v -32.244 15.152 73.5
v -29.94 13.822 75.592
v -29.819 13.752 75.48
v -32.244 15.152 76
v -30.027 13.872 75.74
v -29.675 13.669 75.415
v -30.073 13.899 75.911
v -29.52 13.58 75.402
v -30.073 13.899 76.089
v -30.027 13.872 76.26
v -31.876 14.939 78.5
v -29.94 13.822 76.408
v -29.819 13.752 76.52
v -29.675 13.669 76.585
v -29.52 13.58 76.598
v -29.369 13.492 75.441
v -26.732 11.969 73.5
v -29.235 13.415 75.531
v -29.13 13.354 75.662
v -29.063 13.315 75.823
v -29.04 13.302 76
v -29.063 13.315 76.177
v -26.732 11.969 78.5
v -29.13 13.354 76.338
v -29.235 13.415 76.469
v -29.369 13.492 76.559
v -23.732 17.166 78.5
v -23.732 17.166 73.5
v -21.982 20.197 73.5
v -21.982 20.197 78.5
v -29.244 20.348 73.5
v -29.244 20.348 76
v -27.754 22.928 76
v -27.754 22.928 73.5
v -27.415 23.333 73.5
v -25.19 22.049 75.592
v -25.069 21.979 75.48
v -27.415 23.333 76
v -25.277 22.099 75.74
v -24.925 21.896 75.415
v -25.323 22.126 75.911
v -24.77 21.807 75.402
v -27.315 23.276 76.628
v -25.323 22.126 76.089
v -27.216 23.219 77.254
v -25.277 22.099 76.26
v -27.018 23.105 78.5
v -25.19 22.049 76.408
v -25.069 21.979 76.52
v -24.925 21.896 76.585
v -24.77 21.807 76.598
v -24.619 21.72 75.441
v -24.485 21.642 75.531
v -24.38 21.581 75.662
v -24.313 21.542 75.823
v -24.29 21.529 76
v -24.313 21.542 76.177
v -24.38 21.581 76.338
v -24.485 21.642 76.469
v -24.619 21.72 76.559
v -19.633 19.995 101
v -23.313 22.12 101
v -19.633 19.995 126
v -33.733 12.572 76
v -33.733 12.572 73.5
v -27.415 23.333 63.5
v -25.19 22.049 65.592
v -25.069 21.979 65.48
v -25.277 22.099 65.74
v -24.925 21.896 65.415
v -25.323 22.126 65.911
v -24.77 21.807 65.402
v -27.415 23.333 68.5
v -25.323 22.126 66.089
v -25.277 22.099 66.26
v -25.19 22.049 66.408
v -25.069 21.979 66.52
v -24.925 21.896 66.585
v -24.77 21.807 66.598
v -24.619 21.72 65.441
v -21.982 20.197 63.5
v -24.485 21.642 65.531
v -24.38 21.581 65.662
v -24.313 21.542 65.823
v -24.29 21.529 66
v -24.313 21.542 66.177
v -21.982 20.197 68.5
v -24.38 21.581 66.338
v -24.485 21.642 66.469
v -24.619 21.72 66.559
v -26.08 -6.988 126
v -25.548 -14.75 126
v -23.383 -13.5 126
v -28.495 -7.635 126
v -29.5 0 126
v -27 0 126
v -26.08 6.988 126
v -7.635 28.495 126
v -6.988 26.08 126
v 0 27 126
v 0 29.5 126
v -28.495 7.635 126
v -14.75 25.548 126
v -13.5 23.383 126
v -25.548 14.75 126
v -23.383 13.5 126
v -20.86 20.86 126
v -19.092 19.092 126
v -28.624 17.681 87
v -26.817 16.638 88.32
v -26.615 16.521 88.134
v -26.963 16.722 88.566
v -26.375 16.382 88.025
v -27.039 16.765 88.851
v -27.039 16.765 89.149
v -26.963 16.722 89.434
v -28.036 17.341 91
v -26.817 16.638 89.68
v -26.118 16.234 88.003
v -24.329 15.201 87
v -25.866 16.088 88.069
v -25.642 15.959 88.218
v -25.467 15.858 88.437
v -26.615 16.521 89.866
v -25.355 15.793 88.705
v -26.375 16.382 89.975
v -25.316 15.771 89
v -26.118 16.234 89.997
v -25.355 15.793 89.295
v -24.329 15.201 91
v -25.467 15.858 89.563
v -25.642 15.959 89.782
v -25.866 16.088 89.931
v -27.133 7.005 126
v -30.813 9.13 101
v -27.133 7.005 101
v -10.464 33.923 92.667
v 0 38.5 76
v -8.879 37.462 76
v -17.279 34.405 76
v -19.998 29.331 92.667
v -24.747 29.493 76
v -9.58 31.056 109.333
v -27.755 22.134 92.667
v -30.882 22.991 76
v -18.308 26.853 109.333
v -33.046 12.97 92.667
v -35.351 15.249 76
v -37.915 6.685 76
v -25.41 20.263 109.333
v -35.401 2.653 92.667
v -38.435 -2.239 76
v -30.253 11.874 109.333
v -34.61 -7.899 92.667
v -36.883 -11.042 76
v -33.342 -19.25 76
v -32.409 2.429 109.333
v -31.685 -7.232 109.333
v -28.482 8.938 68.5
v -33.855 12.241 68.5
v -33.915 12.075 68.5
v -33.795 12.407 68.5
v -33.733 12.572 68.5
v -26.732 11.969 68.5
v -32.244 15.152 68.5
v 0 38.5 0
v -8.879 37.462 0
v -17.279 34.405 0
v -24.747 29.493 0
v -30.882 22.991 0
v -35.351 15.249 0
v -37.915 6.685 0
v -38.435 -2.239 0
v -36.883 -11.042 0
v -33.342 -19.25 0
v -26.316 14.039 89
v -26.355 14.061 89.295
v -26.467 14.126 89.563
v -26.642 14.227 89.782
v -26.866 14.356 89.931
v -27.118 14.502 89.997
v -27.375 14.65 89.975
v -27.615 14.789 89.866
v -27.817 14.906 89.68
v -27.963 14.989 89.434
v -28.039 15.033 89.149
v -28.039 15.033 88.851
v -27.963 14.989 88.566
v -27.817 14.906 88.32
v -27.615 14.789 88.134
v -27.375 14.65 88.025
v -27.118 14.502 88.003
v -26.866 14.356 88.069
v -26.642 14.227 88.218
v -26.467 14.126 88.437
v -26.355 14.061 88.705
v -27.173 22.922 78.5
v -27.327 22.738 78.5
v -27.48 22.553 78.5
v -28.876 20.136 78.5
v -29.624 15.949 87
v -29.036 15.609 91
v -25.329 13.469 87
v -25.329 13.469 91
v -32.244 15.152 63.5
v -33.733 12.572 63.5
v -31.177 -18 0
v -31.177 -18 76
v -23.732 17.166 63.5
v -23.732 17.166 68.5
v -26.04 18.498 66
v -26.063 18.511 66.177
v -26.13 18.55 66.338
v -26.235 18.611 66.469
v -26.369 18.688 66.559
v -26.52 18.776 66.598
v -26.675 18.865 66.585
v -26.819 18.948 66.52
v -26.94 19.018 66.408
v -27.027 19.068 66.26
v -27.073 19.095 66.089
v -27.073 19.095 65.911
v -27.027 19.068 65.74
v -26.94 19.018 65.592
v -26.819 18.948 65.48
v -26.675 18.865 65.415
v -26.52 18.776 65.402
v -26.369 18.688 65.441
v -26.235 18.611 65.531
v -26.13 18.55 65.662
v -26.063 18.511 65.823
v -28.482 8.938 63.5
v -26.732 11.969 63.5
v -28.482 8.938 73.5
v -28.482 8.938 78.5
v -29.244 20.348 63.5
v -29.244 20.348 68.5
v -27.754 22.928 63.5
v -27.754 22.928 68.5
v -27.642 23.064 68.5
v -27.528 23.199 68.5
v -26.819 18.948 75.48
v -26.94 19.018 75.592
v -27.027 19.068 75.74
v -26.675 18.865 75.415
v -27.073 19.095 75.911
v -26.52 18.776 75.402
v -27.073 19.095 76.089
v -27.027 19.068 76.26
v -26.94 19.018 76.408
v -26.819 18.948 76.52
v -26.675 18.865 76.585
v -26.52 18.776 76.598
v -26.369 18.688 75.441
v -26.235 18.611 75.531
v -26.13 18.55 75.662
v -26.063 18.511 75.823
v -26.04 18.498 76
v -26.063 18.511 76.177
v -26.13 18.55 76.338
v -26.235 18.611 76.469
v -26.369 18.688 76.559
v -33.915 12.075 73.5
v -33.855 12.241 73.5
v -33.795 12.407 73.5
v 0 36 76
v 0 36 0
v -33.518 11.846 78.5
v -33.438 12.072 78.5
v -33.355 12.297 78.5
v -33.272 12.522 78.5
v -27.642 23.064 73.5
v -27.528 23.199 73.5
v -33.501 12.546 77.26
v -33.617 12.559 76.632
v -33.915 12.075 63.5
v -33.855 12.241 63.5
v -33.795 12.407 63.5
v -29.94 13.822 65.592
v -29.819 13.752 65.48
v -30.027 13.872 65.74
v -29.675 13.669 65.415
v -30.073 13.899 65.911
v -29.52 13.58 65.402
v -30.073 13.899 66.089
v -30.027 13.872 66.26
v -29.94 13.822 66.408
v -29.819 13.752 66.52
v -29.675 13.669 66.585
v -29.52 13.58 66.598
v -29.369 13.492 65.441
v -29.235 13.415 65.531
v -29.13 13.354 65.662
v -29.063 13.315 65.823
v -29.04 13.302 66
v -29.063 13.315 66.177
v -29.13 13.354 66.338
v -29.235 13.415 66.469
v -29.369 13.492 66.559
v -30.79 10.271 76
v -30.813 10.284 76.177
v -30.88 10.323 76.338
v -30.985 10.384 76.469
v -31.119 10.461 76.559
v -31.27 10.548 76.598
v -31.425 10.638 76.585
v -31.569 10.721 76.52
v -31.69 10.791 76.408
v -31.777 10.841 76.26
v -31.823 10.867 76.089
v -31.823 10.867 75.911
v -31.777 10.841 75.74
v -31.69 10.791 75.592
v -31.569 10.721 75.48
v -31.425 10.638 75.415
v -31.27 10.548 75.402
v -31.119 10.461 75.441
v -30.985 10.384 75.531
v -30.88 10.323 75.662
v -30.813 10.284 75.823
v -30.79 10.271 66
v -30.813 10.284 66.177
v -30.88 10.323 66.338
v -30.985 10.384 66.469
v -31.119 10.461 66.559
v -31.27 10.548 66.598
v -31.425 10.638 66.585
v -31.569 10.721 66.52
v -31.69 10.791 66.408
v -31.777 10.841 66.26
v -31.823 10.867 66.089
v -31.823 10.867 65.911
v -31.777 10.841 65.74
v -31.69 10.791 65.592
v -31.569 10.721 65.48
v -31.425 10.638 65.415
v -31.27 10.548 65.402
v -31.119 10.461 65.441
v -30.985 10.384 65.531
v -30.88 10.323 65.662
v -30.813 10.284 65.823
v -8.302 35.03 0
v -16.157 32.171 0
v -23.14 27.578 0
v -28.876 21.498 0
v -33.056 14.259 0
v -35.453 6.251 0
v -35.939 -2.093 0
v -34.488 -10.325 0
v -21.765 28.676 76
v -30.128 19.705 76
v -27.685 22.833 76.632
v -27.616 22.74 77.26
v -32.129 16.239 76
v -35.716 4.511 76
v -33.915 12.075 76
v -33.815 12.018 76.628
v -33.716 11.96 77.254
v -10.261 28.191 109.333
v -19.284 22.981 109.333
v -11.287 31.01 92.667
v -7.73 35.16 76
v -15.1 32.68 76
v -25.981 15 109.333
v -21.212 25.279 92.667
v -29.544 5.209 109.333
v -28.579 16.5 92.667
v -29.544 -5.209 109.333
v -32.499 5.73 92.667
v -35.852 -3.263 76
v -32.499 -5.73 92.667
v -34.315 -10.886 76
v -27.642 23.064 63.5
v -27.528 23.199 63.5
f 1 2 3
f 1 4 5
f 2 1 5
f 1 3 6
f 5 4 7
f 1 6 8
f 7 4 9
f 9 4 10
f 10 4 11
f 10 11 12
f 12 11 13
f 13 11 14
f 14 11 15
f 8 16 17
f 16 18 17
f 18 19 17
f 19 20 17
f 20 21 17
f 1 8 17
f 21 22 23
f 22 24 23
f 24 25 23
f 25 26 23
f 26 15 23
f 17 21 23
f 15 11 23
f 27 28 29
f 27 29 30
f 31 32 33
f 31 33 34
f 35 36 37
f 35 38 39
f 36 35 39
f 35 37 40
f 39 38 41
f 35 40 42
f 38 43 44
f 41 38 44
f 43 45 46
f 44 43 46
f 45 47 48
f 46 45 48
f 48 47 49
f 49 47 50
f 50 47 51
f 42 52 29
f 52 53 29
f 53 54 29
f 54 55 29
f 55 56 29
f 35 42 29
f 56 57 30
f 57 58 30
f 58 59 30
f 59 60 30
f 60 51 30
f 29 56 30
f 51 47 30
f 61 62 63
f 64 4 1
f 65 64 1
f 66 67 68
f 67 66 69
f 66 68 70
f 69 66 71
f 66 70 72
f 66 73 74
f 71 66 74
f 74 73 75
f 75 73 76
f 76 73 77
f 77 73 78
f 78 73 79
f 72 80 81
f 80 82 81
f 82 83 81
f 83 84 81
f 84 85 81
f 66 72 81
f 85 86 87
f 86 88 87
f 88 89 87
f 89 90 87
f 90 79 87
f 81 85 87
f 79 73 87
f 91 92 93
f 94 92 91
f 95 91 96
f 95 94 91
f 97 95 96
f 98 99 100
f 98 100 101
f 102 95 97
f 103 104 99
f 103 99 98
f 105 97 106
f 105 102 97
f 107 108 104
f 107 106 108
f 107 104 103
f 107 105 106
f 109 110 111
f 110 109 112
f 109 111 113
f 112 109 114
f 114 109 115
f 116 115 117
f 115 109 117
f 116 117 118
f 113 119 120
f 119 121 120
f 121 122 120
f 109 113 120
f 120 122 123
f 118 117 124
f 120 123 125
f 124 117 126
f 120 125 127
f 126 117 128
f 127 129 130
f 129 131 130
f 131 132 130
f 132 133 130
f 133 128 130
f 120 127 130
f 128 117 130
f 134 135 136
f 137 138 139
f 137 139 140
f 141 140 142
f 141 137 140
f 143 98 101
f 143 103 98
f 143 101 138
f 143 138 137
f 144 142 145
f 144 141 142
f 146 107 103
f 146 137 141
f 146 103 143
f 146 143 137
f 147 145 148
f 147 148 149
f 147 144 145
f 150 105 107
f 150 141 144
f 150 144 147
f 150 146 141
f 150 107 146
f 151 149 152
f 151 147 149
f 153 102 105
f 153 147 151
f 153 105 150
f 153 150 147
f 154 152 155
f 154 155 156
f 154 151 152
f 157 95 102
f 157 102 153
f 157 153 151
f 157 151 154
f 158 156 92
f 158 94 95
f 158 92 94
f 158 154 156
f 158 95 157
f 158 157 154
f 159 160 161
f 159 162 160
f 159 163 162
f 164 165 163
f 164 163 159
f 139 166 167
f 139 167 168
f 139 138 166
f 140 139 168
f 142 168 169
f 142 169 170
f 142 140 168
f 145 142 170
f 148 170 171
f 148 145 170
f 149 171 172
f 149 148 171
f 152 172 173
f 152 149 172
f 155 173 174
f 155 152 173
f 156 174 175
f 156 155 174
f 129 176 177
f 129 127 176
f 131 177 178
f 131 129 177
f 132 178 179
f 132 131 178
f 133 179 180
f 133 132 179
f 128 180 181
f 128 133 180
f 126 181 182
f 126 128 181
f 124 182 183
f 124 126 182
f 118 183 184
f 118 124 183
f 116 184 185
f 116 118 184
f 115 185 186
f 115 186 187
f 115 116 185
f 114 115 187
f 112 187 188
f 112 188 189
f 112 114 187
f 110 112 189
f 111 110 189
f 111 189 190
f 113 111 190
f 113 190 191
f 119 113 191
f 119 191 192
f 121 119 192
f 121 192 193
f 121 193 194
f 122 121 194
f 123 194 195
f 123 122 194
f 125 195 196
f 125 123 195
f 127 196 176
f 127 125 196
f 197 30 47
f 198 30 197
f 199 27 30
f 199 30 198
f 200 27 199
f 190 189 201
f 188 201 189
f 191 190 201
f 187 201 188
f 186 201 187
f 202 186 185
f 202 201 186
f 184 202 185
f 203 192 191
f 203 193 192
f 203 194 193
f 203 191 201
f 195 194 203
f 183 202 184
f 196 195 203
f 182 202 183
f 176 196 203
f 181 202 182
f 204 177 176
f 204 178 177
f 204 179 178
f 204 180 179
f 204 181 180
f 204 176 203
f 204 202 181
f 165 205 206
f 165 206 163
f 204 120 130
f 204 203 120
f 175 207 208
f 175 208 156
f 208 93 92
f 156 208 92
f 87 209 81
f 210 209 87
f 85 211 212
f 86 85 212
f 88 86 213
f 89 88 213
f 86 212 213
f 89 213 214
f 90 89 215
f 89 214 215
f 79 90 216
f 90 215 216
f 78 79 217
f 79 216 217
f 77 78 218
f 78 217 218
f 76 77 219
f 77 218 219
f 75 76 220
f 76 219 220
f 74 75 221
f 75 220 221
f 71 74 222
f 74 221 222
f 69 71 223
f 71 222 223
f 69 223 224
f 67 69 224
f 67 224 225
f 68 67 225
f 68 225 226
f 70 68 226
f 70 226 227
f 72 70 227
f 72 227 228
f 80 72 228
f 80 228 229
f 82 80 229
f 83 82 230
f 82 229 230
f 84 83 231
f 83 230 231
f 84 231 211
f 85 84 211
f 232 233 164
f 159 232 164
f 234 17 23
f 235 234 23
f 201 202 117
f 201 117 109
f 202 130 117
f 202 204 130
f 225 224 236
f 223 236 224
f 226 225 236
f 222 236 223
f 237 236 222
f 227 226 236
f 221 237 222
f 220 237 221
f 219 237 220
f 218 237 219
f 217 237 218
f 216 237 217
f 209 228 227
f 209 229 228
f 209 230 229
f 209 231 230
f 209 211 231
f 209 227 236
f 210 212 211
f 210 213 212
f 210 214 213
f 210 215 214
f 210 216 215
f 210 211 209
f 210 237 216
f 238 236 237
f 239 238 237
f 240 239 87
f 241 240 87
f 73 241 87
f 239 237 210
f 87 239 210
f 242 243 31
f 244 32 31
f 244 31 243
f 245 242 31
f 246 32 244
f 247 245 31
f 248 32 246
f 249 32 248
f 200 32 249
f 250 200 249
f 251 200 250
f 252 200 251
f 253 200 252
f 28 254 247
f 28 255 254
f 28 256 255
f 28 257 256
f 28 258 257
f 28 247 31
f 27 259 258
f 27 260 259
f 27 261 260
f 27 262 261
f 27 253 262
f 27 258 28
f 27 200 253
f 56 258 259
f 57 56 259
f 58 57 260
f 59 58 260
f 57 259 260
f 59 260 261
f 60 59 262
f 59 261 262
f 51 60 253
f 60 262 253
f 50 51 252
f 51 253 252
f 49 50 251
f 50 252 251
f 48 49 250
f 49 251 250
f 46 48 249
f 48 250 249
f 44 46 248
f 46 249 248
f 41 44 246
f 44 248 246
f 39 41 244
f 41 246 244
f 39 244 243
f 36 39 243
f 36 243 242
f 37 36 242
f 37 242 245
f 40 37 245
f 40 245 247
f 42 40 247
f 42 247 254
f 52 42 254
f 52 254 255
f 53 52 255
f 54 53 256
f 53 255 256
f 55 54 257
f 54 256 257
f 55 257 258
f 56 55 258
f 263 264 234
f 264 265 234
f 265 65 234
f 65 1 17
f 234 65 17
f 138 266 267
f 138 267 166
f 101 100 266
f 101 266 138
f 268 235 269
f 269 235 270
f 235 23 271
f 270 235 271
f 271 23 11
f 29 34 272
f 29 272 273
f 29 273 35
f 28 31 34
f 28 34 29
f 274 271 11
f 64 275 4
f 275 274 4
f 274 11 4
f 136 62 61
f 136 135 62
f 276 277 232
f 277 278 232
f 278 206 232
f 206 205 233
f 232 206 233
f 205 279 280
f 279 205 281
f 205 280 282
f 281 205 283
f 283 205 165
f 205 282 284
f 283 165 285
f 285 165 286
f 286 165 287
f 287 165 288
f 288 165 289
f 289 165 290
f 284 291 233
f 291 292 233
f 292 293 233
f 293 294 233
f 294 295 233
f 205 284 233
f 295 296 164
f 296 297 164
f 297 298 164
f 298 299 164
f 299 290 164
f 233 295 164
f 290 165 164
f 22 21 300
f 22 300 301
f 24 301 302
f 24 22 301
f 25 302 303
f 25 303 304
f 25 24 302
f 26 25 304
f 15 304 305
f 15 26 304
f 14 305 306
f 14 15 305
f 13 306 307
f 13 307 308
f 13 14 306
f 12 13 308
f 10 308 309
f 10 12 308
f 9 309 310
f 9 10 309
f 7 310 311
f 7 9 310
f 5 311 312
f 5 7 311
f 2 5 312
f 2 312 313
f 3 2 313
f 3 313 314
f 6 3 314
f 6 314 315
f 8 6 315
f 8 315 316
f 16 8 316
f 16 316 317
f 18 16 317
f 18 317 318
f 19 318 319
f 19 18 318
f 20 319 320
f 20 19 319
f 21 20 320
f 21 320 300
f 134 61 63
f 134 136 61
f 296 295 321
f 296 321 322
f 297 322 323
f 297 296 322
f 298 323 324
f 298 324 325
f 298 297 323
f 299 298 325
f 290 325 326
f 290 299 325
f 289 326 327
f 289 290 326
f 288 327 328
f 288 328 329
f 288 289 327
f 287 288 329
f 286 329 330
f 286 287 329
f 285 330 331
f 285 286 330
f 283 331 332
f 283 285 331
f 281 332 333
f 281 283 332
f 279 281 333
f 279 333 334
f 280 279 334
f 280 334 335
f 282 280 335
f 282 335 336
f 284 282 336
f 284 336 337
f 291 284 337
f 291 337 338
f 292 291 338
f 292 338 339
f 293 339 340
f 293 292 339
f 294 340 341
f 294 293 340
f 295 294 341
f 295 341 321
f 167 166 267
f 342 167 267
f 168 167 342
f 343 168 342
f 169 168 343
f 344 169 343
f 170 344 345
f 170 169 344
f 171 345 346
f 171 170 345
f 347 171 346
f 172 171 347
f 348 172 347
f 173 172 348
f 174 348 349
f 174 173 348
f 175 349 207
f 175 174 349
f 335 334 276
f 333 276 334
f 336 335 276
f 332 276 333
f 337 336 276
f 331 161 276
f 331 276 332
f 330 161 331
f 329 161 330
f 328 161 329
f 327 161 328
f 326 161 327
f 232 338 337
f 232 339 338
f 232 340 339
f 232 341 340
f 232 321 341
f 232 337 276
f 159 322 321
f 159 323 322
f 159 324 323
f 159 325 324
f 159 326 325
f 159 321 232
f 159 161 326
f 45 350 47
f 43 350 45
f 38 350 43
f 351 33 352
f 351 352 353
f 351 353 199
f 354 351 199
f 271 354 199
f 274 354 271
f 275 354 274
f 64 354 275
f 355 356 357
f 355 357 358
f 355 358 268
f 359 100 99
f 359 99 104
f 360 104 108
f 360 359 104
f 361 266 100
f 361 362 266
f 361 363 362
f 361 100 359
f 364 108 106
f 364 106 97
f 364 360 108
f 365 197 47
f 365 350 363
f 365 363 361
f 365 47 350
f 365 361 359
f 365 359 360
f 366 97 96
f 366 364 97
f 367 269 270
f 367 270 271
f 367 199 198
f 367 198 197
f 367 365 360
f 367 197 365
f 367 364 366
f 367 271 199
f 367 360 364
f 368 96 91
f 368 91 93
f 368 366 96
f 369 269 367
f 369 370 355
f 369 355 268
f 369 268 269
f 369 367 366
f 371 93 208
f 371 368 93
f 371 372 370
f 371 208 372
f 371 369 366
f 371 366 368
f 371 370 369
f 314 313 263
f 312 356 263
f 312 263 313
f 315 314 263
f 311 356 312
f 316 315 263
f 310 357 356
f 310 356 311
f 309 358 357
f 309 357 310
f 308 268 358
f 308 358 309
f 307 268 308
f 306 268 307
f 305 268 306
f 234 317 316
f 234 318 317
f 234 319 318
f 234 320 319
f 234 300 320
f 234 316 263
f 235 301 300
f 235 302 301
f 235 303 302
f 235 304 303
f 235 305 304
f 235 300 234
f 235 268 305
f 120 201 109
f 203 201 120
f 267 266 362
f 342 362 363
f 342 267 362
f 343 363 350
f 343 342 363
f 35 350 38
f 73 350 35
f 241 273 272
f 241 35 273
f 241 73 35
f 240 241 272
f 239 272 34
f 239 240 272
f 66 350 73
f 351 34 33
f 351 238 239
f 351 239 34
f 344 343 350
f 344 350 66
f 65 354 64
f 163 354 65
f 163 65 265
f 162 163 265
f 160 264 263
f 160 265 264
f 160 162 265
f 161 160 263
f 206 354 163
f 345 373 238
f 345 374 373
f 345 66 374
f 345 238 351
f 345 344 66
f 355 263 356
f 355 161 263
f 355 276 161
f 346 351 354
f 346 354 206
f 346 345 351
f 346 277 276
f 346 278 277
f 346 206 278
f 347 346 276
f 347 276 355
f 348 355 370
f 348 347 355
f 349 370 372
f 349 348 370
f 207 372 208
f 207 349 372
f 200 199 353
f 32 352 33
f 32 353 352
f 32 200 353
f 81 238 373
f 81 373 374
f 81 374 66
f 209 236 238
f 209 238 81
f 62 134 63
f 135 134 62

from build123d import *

# Parameters (mm, degrees)
F2_ANGLE  = 120
F5_DEPTH  = 7.5
F7_DEPTH  = 7.5
F11_R     = 0.6
F11_W     = 6.365
F11_H     = 5
F12_DEPTH = 3.5
F10_R     = 0.6
F10_W     = 6.365
F10_H     = 5
F13_DEPTH = 3.5
F4_R      = 1
F14_DEPTH = 1


with BuildPart() as f2:
    # F1 (on Right) → F2 (revolve)
    with BuildSketch(Plane.YZ):
        Polygon((38.5, 76), (29.5, 126), (27, 126), (36, 76), (36, 0), (38.5, 0), align=None)
    revolve(axis=Axis((0, 0, 63), (0, 0, 1)), revolution_arc=F2_ANGLE)

    # F11 (on offset) → F12 (join)
    with BuildSketch(Plane(origin=(1.5, 2.5980762114, 0), x_dir=(0.8660254038, -0.5, 0), z_dir=(-0.5, -0.8660254038, 0))):
        Polygon((-35.5, 73.5), (-29.135, 73.5), (-29.135, 78.5), (-35.075, 78.5), (-35.5, 76), align=None)
        with Locations((-32.4, 76)):
            Circle(F11_R, mode=Mode.SUBTRACT)
        with Locations((-32.3175, 66)):
            Rectangle(F11_W, F11_H)
        with Locations((-32.4, 66)):
            Circle(F11_R, mode=Mode.SUBTRACT)
    extrude(amount=-F12_DEPTH)

    # F10 (on offset) → F13 (join)
    with BuildSketch(Plane(origin=(-1.5, -2.5980762114, 0), x_dir=(0.8660254038, -0.5, 0), z_dir=(-0.5, -0.8660254038, 0))):
        Polygon((-35.5, 73.5), (-29.135, 73.5), (-29.135, 78.5), (-35.075, 78.5), (-35.5, 76), align=None)
        with Locations((-32.4, 76)):
            Circle(F10_R, mode=Mode.SUBTRACT)
        with Locations((-32.3175, 66)):
            Rectangle(F10_W, F10_H)
        with Locations((-32.4, 66)):
            Circle(F10_R, mode=Mode.SUBTRACT)
    extrude(amount=F13_DEPTH)


with BuildPart() as f5:
    # F4 (on line) → F5 (new body, symmetric)
    with BuildSketch(Plane(origin=(0, 0, 0), x_dir=(0.8660254038, -0.5, 0), z_dir=(-0.5, -0.8660254038, 0))):
        Polygon((-27, 101), (-27, 126), (-31.25, 101), align=None)
    extrude(amount=F5_DEPTH, both=True)


with BuildPart() as f7:
    # F4 (on line) → F7 (new body, symmetric)
    with BuildSketch(Plane(origin=(0, 0, 0), x_dir=(0.8660254038, -0.5, 0), z_dir=(-0.5, -0.8660254038, 0))):
        Polygon((-27, 101), (-27, 126), (-31.25, 101), align=None)
    extrude(amount=F7_DEPTH, both=True)


with BuildPart() as f14:
    # F4 (on line) → F14 (new body, symmetric)
    with BuildSketch(Plane(origin=(0, 0, 0), x_dir=(0.8660254038, -0.5, 0), z_dir=(-0.5, -0.8660254038, 0))):
        Polygon((-28.67, 91), (-32.95, 91), (-33.63, 87), (-28.67, 87), align=None)
        with Locations((-30.81, 89)):
            Circle(F4_R, mode=Mode.SUBTRACT)
    extrude(amount=F14_DEPTH, both=True)


solid = Compound([f2.part, f7.part, f14.part])
